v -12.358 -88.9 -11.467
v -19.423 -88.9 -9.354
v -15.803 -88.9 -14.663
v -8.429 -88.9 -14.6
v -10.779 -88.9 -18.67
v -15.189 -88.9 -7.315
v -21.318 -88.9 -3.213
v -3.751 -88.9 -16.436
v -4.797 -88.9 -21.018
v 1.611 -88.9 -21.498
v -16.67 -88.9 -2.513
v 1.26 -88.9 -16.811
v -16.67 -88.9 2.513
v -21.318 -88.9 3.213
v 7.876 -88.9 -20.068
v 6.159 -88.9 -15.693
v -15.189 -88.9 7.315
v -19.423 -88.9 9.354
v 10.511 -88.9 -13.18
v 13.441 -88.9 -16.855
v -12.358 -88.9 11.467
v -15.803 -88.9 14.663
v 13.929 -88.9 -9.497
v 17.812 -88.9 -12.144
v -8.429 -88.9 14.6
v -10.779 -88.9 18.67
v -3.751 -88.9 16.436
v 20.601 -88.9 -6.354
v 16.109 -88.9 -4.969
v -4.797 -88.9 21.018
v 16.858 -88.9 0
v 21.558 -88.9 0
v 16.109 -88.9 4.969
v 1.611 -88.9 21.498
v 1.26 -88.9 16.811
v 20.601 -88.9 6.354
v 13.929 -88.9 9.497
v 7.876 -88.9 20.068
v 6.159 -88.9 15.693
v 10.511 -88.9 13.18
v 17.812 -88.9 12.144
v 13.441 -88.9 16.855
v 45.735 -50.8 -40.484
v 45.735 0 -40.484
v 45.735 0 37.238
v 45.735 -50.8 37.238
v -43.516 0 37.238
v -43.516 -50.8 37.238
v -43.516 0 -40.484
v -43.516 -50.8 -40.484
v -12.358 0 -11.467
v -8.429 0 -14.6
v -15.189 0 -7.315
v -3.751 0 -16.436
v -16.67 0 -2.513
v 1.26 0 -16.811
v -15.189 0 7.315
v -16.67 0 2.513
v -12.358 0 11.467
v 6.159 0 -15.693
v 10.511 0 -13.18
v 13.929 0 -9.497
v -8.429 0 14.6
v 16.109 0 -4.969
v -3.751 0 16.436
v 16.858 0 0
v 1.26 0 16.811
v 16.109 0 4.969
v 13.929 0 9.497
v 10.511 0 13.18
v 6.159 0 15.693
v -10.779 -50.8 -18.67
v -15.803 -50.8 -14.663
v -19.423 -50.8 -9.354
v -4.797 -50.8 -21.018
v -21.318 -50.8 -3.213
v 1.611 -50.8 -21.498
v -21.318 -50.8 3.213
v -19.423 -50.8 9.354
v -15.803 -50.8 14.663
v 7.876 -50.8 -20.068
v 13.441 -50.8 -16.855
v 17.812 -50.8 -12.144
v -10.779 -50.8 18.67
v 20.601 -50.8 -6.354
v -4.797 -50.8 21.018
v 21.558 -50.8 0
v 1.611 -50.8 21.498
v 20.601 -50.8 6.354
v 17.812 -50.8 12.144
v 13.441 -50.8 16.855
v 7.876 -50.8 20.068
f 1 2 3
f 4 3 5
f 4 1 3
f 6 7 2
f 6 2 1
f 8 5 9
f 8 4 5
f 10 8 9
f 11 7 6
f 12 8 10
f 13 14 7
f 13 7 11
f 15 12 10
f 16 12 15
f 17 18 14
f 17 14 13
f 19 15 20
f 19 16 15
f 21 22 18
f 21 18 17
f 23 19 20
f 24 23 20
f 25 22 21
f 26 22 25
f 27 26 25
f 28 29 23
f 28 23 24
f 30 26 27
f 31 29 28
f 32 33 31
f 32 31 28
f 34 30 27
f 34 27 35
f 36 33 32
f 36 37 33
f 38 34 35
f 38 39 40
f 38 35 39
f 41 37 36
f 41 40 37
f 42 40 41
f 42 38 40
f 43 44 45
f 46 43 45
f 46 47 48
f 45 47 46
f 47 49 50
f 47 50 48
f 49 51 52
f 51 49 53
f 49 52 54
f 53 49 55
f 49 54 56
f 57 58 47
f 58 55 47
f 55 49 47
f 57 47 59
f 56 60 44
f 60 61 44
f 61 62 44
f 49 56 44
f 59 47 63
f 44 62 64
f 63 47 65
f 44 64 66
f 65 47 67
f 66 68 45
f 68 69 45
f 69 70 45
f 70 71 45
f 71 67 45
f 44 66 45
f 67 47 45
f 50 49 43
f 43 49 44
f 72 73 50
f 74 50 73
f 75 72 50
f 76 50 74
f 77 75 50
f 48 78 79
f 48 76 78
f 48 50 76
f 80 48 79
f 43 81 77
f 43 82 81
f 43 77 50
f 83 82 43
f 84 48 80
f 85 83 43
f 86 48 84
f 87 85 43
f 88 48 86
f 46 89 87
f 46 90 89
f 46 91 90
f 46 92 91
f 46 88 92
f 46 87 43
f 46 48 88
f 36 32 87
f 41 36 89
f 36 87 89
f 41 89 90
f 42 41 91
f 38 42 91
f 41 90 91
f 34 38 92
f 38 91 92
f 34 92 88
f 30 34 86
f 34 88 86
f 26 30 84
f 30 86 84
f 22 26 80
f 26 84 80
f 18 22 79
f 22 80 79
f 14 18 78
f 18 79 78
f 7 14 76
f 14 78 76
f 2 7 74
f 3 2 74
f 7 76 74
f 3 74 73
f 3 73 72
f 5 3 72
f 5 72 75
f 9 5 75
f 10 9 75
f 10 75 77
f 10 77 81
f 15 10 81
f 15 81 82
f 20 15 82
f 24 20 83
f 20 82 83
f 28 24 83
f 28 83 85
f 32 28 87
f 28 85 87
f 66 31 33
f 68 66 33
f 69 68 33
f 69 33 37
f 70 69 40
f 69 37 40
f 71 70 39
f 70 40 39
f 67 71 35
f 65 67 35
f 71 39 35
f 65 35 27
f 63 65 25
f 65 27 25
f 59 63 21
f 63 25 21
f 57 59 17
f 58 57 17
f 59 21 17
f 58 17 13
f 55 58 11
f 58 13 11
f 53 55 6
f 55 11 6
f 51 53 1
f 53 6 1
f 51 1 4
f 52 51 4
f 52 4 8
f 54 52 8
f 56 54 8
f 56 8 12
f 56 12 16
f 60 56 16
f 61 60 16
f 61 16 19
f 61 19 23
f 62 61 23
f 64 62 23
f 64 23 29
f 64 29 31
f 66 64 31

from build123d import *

# Parameters (mm, degrees)
F0_W     = 89.250375
F0_H     = 77.722203
F1_DEPTH = 50.8
F2_R     = 21.558344
F3_DEPTH = 38.1
F4_R     = 16.858314
F5_DEPTH = 127


with BuildPart() as f1:
    # F0 (on Front) → F1 (new body)
    with BuildSketch(Plane.XZ):
        with Locations((1.109326, -1.622727)):
            Rectangle(F0_W, F0_H)
    extrude(amount=F1_DEPTH)

    # F2 (on face) → F3 (join)
    with BuildSketch(Plane.XZ.offset(50.8)):
        Circle(F2_R)
    extrude(amount=F3_DEPTH)

    # F4 (on face) → F5 (cut)
    with BuildSketch(Plane.XZ.offset(88.9)):
        Circle(F4_R)
    extrude(amount=-F5_DEPTH, mode=Mode.SUBTRACT)


solid = f1.part
